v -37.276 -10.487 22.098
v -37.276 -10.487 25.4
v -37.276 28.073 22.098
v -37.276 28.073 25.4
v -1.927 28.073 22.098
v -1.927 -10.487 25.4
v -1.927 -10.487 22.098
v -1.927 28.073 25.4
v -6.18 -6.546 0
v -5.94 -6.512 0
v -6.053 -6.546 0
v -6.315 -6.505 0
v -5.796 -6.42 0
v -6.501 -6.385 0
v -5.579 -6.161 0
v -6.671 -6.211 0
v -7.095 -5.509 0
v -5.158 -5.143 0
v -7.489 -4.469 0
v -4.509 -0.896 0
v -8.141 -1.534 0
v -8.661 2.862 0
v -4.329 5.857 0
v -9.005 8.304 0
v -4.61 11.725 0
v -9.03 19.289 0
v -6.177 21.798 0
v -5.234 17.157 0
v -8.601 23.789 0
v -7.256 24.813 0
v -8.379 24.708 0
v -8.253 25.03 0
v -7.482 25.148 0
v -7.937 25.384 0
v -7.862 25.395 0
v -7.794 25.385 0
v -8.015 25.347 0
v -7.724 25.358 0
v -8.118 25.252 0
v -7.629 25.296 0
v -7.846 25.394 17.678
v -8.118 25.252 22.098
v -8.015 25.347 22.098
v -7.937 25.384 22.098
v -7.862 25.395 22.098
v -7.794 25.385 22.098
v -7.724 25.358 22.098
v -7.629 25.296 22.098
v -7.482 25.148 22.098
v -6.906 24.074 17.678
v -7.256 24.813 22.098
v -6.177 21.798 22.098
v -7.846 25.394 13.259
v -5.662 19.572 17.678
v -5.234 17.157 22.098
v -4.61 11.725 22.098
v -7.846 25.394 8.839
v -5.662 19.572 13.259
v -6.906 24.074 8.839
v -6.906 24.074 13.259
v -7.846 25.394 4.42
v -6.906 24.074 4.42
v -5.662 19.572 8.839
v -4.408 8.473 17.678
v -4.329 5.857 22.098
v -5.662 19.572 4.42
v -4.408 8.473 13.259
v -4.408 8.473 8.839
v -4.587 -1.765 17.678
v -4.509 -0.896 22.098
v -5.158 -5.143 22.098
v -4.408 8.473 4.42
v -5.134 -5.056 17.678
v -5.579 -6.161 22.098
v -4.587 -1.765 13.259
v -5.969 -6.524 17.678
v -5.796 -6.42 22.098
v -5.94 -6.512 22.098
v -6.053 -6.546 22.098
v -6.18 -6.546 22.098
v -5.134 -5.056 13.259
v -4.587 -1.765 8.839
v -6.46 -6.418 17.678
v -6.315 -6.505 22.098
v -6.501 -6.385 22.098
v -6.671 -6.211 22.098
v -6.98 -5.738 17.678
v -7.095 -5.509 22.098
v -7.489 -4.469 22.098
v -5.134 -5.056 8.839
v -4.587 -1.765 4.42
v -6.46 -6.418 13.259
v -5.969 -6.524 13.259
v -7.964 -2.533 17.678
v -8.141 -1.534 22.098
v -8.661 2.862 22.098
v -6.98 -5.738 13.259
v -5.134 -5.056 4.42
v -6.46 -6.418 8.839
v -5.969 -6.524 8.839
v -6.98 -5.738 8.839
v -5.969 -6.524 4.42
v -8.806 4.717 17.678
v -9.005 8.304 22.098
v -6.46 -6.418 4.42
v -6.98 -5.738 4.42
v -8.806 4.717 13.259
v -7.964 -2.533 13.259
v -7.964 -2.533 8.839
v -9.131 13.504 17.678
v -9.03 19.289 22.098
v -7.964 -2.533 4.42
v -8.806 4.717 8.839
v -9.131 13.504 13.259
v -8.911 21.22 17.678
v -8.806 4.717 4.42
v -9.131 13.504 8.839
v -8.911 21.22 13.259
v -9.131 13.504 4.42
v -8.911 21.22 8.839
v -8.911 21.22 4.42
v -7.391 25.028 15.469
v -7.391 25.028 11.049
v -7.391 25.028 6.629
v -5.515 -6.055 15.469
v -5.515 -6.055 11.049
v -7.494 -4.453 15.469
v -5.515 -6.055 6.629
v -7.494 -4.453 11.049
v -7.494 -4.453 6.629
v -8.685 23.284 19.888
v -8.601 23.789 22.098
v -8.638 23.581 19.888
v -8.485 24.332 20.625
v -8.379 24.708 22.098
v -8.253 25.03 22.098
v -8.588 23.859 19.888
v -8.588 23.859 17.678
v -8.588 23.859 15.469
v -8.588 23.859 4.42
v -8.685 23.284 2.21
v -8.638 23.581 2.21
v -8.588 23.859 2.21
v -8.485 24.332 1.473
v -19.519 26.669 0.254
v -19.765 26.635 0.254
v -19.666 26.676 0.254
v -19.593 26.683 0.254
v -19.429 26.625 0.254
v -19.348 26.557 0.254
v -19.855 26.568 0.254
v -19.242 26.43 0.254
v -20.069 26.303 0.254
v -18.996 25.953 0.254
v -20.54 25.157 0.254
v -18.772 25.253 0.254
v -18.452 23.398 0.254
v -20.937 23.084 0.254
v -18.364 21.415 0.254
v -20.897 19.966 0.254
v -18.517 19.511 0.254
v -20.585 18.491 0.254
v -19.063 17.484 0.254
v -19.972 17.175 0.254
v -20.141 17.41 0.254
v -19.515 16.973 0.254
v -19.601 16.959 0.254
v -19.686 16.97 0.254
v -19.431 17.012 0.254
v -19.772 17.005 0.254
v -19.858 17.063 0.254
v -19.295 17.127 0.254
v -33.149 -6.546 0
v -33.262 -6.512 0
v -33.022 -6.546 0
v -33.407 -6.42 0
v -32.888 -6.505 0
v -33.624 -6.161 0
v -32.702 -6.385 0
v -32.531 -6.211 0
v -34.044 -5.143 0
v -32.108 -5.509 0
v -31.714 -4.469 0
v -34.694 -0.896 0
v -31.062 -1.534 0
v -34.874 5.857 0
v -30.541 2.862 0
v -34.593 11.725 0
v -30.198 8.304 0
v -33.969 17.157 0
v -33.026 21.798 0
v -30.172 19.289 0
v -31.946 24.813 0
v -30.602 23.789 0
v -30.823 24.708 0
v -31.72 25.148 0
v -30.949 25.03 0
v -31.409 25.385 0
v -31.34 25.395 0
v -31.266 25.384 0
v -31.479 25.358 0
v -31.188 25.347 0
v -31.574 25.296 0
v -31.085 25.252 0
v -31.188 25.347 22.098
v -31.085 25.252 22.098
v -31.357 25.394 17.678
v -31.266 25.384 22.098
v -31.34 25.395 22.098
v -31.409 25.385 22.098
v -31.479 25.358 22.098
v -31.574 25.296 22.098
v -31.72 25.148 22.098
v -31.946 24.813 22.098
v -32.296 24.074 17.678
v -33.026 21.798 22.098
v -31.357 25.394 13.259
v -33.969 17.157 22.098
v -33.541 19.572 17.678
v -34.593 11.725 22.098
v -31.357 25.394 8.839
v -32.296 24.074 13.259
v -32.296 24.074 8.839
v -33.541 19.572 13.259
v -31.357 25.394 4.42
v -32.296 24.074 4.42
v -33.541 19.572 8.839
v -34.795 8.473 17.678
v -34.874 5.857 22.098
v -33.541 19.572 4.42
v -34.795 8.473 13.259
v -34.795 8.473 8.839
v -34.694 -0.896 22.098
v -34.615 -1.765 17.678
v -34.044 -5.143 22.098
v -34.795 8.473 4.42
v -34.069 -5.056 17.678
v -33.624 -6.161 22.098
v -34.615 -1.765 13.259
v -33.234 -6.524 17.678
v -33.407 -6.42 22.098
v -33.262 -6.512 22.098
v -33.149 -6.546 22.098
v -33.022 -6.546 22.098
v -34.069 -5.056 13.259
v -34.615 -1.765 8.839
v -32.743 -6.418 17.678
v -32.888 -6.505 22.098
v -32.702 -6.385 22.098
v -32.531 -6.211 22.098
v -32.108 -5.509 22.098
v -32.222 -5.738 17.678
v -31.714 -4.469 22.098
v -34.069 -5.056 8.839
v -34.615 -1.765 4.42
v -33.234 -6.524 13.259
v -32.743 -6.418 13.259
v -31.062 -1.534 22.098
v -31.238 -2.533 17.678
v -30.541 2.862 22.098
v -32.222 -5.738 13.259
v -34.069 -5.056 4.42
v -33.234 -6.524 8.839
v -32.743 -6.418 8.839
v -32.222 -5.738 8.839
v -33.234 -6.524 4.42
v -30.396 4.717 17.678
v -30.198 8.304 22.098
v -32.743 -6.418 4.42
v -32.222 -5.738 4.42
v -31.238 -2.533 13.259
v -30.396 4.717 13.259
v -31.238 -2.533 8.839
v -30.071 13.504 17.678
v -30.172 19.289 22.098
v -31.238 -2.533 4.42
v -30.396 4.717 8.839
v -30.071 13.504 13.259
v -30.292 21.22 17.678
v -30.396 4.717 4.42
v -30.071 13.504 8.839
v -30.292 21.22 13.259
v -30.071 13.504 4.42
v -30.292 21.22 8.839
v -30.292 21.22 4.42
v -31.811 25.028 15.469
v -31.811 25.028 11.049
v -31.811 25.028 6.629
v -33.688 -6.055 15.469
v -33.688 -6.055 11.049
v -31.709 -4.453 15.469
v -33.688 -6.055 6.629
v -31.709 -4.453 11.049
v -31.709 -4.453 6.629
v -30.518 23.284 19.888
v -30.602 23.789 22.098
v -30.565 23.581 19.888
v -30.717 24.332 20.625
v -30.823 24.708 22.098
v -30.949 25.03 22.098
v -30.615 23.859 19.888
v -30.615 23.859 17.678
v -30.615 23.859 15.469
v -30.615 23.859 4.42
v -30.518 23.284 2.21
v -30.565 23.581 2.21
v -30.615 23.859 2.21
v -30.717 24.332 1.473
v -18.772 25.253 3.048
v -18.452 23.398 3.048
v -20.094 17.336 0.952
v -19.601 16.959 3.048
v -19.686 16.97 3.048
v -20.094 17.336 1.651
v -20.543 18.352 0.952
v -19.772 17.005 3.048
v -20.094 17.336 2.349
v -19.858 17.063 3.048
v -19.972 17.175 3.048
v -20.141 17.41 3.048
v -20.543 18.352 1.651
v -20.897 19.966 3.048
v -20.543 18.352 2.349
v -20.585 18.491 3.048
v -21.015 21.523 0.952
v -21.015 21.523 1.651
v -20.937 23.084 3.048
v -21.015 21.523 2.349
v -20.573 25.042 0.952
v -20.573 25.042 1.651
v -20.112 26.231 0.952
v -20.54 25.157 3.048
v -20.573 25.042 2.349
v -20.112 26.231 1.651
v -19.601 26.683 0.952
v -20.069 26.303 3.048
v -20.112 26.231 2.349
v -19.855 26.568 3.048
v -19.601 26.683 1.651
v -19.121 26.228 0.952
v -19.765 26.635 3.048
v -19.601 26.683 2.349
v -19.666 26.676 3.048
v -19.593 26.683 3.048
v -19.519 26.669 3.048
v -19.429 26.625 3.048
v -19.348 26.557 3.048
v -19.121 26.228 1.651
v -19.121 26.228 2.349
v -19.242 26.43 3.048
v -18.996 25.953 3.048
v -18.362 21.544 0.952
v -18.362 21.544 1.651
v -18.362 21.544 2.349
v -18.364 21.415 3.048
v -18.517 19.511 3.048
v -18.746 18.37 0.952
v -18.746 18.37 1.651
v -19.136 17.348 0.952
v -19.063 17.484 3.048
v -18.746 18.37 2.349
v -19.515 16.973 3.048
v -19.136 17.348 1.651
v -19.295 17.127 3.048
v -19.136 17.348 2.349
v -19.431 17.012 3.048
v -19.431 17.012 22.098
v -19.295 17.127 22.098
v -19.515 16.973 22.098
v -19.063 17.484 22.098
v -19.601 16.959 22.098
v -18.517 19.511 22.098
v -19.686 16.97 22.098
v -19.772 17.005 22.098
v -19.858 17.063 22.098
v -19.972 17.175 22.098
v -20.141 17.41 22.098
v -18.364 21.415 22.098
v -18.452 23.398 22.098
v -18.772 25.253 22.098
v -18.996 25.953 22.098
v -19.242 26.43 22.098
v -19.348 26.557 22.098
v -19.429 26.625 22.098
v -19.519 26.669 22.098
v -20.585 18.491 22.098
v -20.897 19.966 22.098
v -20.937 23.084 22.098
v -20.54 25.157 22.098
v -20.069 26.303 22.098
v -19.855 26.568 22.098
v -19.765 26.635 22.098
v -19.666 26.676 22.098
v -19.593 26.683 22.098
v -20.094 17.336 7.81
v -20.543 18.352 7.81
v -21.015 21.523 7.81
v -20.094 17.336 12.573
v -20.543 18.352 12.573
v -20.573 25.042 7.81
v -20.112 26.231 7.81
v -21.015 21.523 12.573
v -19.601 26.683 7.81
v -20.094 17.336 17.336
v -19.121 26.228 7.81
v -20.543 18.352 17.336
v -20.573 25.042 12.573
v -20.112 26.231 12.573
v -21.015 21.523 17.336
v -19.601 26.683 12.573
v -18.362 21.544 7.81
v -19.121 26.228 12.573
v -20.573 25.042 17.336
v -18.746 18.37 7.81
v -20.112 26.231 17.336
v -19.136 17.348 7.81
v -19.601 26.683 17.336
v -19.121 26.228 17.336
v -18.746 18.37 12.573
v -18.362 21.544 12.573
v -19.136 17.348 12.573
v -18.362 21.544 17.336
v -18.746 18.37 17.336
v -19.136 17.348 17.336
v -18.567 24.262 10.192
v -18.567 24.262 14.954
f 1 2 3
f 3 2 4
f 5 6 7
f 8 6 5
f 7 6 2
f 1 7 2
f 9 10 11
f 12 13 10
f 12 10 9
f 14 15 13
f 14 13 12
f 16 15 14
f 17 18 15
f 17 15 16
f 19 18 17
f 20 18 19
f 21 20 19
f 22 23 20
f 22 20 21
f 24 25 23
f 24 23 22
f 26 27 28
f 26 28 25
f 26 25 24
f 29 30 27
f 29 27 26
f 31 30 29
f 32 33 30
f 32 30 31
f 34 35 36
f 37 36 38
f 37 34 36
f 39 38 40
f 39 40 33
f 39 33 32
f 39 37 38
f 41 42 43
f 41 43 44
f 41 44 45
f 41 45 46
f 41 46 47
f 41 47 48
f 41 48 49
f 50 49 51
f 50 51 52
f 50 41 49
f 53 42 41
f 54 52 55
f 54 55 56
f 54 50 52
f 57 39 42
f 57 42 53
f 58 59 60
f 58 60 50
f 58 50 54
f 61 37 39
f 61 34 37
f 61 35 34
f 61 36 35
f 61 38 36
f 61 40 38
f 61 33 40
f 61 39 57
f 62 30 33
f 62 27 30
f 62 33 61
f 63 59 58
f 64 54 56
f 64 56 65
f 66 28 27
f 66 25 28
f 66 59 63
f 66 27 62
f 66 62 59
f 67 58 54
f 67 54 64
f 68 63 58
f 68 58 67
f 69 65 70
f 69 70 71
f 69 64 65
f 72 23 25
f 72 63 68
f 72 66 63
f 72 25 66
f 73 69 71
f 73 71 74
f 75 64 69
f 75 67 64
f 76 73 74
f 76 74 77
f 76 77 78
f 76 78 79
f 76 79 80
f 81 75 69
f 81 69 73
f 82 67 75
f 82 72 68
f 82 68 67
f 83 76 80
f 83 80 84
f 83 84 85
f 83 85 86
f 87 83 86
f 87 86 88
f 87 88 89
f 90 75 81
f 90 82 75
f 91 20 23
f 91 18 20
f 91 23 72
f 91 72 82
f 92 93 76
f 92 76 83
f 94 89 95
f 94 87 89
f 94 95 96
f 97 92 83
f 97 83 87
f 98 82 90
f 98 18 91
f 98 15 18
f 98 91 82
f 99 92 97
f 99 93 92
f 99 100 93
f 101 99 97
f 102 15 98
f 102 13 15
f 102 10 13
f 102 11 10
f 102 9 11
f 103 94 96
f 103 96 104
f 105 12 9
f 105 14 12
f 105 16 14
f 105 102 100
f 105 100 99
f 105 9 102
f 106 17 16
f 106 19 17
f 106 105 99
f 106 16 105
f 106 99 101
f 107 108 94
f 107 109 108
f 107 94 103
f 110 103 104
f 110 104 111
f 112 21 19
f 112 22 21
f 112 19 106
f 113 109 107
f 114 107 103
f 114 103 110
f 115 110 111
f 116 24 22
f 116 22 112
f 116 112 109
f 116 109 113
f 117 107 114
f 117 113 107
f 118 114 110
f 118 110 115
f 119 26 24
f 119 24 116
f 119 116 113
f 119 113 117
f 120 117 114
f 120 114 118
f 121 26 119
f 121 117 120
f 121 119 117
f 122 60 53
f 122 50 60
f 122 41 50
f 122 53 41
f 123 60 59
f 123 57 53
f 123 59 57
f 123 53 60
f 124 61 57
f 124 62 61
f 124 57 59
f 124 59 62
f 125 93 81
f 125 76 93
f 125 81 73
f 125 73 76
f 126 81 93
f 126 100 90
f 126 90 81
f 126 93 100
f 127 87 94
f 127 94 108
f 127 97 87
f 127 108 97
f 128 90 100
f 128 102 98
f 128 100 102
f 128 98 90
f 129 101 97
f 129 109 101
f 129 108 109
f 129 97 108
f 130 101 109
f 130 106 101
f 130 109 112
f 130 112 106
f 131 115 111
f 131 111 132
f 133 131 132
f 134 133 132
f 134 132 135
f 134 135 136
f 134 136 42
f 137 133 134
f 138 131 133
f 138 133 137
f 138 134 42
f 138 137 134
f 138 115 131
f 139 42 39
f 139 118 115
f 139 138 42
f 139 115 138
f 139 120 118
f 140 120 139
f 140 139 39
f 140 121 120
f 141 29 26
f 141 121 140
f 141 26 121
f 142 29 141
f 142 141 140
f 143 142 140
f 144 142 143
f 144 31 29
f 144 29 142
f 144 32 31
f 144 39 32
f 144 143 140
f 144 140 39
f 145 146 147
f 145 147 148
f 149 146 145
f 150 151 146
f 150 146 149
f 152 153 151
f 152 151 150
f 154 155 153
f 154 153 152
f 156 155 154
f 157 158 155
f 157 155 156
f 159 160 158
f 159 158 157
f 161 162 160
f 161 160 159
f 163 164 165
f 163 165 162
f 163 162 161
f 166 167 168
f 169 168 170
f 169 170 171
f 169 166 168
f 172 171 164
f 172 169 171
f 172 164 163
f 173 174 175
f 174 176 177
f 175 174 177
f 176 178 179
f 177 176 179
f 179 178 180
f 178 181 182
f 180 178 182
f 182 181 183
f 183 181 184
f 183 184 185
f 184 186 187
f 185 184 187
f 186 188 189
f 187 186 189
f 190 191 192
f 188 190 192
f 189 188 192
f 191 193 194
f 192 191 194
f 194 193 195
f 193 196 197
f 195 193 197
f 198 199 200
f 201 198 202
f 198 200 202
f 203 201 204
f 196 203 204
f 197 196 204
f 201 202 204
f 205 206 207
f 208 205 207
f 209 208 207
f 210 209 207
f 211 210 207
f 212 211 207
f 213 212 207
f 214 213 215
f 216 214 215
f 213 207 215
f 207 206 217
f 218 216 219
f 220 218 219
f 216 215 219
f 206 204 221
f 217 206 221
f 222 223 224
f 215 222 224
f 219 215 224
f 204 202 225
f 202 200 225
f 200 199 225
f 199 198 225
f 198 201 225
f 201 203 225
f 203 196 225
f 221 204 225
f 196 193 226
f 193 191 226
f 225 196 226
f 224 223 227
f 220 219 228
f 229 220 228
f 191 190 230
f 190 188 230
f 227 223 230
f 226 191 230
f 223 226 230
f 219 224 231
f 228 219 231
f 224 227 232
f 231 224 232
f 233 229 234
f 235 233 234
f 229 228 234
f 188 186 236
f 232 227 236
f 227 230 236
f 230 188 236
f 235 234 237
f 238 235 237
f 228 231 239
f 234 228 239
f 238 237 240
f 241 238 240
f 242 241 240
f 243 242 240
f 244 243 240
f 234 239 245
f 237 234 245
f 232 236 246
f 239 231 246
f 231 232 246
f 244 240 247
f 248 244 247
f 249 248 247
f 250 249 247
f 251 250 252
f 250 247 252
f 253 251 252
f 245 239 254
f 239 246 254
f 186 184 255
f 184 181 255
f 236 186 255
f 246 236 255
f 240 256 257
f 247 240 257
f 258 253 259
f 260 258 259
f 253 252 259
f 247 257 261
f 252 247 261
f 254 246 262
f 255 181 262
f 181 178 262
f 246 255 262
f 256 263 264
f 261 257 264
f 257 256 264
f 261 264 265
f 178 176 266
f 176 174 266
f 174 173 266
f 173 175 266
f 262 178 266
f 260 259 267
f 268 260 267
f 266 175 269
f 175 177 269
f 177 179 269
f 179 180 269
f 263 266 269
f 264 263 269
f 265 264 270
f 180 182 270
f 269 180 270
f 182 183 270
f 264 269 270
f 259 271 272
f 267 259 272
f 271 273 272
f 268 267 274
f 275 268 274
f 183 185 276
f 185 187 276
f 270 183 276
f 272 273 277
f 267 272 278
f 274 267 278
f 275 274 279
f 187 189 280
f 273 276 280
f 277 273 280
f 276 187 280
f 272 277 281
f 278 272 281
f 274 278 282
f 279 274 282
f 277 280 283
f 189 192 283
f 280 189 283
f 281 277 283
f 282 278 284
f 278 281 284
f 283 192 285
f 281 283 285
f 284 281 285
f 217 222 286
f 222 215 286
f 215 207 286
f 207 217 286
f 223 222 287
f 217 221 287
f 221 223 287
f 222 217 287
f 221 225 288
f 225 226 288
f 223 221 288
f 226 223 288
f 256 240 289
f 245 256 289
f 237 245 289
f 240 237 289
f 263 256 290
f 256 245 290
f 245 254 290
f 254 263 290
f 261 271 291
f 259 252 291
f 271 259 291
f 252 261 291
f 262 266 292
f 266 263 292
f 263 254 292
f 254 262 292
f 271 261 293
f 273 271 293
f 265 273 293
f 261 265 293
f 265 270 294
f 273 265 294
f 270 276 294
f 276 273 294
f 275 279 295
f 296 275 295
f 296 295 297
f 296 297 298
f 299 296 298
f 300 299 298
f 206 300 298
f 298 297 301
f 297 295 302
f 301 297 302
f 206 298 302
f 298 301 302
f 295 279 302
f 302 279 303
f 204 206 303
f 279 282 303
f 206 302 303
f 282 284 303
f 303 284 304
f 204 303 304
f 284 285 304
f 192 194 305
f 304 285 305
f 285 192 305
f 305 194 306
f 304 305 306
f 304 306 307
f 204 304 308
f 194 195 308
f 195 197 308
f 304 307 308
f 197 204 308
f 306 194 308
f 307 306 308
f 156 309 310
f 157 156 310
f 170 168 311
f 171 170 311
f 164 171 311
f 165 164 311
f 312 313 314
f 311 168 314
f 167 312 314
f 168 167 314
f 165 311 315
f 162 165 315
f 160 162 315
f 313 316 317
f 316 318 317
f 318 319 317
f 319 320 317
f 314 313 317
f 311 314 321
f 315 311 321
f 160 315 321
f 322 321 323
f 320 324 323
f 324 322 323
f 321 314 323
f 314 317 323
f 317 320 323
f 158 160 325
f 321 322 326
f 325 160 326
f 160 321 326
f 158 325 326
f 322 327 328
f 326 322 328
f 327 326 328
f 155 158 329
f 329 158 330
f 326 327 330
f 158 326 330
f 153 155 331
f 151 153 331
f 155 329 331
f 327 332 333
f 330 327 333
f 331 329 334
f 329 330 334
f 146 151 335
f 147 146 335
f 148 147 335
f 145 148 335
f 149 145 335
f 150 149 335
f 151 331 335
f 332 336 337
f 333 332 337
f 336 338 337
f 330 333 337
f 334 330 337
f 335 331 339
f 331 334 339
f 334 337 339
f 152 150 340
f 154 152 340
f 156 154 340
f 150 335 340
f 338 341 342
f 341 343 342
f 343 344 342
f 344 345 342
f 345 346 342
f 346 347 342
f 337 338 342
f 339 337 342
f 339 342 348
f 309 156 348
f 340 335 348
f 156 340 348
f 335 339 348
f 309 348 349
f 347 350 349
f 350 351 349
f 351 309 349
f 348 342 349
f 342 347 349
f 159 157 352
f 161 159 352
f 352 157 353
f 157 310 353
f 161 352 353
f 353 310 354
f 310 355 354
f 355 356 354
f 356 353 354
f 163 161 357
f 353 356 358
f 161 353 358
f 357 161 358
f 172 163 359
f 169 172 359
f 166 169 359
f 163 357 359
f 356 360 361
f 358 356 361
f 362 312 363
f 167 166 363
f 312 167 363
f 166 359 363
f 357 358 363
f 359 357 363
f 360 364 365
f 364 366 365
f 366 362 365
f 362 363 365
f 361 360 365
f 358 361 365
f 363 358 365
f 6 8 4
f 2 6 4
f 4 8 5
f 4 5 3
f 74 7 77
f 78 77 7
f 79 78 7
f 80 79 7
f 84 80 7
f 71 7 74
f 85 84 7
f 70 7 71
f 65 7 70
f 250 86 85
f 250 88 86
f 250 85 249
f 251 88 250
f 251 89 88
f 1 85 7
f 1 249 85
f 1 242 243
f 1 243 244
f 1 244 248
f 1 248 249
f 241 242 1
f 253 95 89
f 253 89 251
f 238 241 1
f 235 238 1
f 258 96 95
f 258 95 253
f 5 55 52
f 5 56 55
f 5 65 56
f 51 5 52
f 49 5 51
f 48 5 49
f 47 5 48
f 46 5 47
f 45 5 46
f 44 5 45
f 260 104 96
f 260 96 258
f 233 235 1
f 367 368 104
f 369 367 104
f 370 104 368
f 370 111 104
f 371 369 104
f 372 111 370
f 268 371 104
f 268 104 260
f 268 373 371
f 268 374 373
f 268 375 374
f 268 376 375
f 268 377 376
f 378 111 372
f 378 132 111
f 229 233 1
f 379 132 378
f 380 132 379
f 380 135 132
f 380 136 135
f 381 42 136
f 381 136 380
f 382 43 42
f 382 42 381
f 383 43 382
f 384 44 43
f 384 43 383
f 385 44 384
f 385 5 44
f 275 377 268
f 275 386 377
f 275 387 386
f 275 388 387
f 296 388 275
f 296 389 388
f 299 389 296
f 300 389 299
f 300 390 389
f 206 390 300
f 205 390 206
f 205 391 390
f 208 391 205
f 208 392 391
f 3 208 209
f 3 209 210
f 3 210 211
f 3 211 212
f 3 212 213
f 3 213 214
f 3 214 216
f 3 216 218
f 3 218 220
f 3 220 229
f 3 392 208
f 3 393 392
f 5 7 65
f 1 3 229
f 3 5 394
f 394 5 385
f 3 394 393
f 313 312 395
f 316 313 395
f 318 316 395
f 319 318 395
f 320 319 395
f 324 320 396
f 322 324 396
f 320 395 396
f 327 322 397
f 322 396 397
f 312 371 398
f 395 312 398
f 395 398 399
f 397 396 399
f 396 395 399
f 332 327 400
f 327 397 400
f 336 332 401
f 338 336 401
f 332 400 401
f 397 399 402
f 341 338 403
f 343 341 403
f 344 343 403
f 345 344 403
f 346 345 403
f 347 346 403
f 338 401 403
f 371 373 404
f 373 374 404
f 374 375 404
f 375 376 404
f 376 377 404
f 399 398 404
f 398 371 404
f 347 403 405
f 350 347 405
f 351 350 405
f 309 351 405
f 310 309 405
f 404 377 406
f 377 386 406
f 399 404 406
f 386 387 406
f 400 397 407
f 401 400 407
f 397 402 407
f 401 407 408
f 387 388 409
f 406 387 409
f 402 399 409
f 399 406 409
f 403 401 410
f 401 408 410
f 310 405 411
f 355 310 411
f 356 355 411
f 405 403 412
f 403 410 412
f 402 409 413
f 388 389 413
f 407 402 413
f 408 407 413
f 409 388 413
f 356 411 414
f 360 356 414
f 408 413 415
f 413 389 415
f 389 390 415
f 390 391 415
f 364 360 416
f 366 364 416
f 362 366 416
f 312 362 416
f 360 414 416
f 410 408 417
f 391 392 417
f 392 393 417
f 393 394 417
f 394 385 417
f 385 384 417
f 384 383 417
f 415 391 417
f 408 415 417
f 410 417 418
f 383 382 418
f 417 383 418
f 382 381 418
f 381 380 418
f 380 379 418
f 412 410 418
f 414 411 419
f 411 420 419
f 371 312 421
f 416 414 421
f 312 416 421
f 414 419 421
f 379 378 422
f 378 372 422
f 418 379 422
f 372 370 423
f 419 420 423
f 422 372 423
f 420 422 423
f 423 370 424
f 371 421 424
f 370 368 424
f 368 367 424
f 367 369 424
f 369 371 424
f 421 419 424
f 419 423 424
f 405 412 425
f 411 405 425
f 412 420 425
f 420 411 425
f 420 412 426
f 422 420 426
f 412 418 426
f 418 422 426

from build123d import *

# Parameters (mm, degrees)
F1_DEPTH = 25.4
F2_W     = 17.6742579788
F2_H     = 38.560397923
F3_DEPTH = 3.302
F6_DEPTH = 19.05
F7_DEPTH = 21.844


with BuildPart() as f1:
    # F0 (on Top) → F1 (new body)
    with BuildSketch(Plane.XY):
        with BuildLine():
            add(Edge.make_bspline(
                [(-31.0847982764, 25.2515990287), (-31.7698792393, 26.0822197703), (-34.7474391826, 17.7726717647), (-35.3043048421, -0.599531426), (-33.4496241903, -8.0378860922), (-29.8432562482, -2.4841204704), (-29.6331173718, 23.4915205345), (-31.0847982764, 25.2515990287)],
                knots=[0, 0, 0, 0, 0.1487844876, 0.425240938, 0.5583817626, 0.6847268991, 1, 1, 1, 1], degree=3))
        make_face()
    extrude(amount=F1_DEPTH)

    # F2 (on face) → F3 (join)
    with BuildSketch(Plane.XY.offset(25.4)):
        with Locations((-28.4384423867, 8.7931714952)):
            Rectangle(F2_W, F2_H)
        with BuildLine():
            add(Edge.make_bspline(
                [(-31.0847982764, 25.2515990287), (-31.7698792393, 26.0822197703), (-34.7474391826, 17.7726717647), (-35.3043048421, -0.599531426), (-33.4496241903, -8.0378860922), (-29.8432562482, -2.4841204704), (-29.6331173718, 23.4915205345), (-31.0847982764, 25.2515990287)],
                knots=[0, 0, 0, 0, 0.1487844876, 0.425240938, 0.5583817626, 0.6847268991, 1, 1, 1, 1], degree=3))
        make_face(mode=Mode.SUBTRACT)
    extrude(amount=-F3_DEPTH)

    # F4: F1 across face


with BuildPart() as f1_1:
    add(f1.part)
    add(f1.part.mirror(Plane(origin=(-19.6013133973, 8.7931714952, 23.749), x_dir=(0, 1, 0), z_dir=(1, 0, 0))))

    # F5 (on face) → F6 (join)
    with BuildSketch(Plane(origin=(0, 0, 22.098), x_dir=(1, 0, 0), z_dir=(0, 0, -1))):
        with BuildLine():
            add(Edge.make_bspline(
                [(-19.6013133973, -16.9590394944), (-20.2534853579, -16.9497783141), (-21.7654957969, -21.5023492217), (-19.5189288998, -29.3392084323), (-17.7834131566, -21.5243112248), (-18.9511314366, -16.9682724157), (-19.6013133973, -16.9590394944)],
                knots=[0, 0, 0, 0, 0.2434890086, 0.5011335003, 0.7572539598, 1, 1, 1, 1], degree=3))
        make_face()
    extrude(amount=F6_DEPTH)

    # F5 (on face) → F7 (join)
    with BuildSketch(Plane(origin=(0, 0, 22.098), x_dir=(1, 0, 0), z_dir=(0, 0, -1))):
        with BuildLine():
            add(Edge.make_bspline(
                [(-19.6013133973, -16.9590394944), (-20.2534853579, -16.9497783141), (-21.7654957969, -21.5023492217), (-19.5189288998, -29.3392084323), (-17.7834131566, -21.5243112248), (-18.9511314366, -16.9682724157), (-19.6013133973, -16.9590394944)],
                knots=[0, 0, 0, 0, 0.2434890086, 0.5011335003, 0.7572539598, 1, 1, 1, 1], degree=3))
        make_face()
    extrude(amount=F7_DEPTH)


solid = f1_1.part
